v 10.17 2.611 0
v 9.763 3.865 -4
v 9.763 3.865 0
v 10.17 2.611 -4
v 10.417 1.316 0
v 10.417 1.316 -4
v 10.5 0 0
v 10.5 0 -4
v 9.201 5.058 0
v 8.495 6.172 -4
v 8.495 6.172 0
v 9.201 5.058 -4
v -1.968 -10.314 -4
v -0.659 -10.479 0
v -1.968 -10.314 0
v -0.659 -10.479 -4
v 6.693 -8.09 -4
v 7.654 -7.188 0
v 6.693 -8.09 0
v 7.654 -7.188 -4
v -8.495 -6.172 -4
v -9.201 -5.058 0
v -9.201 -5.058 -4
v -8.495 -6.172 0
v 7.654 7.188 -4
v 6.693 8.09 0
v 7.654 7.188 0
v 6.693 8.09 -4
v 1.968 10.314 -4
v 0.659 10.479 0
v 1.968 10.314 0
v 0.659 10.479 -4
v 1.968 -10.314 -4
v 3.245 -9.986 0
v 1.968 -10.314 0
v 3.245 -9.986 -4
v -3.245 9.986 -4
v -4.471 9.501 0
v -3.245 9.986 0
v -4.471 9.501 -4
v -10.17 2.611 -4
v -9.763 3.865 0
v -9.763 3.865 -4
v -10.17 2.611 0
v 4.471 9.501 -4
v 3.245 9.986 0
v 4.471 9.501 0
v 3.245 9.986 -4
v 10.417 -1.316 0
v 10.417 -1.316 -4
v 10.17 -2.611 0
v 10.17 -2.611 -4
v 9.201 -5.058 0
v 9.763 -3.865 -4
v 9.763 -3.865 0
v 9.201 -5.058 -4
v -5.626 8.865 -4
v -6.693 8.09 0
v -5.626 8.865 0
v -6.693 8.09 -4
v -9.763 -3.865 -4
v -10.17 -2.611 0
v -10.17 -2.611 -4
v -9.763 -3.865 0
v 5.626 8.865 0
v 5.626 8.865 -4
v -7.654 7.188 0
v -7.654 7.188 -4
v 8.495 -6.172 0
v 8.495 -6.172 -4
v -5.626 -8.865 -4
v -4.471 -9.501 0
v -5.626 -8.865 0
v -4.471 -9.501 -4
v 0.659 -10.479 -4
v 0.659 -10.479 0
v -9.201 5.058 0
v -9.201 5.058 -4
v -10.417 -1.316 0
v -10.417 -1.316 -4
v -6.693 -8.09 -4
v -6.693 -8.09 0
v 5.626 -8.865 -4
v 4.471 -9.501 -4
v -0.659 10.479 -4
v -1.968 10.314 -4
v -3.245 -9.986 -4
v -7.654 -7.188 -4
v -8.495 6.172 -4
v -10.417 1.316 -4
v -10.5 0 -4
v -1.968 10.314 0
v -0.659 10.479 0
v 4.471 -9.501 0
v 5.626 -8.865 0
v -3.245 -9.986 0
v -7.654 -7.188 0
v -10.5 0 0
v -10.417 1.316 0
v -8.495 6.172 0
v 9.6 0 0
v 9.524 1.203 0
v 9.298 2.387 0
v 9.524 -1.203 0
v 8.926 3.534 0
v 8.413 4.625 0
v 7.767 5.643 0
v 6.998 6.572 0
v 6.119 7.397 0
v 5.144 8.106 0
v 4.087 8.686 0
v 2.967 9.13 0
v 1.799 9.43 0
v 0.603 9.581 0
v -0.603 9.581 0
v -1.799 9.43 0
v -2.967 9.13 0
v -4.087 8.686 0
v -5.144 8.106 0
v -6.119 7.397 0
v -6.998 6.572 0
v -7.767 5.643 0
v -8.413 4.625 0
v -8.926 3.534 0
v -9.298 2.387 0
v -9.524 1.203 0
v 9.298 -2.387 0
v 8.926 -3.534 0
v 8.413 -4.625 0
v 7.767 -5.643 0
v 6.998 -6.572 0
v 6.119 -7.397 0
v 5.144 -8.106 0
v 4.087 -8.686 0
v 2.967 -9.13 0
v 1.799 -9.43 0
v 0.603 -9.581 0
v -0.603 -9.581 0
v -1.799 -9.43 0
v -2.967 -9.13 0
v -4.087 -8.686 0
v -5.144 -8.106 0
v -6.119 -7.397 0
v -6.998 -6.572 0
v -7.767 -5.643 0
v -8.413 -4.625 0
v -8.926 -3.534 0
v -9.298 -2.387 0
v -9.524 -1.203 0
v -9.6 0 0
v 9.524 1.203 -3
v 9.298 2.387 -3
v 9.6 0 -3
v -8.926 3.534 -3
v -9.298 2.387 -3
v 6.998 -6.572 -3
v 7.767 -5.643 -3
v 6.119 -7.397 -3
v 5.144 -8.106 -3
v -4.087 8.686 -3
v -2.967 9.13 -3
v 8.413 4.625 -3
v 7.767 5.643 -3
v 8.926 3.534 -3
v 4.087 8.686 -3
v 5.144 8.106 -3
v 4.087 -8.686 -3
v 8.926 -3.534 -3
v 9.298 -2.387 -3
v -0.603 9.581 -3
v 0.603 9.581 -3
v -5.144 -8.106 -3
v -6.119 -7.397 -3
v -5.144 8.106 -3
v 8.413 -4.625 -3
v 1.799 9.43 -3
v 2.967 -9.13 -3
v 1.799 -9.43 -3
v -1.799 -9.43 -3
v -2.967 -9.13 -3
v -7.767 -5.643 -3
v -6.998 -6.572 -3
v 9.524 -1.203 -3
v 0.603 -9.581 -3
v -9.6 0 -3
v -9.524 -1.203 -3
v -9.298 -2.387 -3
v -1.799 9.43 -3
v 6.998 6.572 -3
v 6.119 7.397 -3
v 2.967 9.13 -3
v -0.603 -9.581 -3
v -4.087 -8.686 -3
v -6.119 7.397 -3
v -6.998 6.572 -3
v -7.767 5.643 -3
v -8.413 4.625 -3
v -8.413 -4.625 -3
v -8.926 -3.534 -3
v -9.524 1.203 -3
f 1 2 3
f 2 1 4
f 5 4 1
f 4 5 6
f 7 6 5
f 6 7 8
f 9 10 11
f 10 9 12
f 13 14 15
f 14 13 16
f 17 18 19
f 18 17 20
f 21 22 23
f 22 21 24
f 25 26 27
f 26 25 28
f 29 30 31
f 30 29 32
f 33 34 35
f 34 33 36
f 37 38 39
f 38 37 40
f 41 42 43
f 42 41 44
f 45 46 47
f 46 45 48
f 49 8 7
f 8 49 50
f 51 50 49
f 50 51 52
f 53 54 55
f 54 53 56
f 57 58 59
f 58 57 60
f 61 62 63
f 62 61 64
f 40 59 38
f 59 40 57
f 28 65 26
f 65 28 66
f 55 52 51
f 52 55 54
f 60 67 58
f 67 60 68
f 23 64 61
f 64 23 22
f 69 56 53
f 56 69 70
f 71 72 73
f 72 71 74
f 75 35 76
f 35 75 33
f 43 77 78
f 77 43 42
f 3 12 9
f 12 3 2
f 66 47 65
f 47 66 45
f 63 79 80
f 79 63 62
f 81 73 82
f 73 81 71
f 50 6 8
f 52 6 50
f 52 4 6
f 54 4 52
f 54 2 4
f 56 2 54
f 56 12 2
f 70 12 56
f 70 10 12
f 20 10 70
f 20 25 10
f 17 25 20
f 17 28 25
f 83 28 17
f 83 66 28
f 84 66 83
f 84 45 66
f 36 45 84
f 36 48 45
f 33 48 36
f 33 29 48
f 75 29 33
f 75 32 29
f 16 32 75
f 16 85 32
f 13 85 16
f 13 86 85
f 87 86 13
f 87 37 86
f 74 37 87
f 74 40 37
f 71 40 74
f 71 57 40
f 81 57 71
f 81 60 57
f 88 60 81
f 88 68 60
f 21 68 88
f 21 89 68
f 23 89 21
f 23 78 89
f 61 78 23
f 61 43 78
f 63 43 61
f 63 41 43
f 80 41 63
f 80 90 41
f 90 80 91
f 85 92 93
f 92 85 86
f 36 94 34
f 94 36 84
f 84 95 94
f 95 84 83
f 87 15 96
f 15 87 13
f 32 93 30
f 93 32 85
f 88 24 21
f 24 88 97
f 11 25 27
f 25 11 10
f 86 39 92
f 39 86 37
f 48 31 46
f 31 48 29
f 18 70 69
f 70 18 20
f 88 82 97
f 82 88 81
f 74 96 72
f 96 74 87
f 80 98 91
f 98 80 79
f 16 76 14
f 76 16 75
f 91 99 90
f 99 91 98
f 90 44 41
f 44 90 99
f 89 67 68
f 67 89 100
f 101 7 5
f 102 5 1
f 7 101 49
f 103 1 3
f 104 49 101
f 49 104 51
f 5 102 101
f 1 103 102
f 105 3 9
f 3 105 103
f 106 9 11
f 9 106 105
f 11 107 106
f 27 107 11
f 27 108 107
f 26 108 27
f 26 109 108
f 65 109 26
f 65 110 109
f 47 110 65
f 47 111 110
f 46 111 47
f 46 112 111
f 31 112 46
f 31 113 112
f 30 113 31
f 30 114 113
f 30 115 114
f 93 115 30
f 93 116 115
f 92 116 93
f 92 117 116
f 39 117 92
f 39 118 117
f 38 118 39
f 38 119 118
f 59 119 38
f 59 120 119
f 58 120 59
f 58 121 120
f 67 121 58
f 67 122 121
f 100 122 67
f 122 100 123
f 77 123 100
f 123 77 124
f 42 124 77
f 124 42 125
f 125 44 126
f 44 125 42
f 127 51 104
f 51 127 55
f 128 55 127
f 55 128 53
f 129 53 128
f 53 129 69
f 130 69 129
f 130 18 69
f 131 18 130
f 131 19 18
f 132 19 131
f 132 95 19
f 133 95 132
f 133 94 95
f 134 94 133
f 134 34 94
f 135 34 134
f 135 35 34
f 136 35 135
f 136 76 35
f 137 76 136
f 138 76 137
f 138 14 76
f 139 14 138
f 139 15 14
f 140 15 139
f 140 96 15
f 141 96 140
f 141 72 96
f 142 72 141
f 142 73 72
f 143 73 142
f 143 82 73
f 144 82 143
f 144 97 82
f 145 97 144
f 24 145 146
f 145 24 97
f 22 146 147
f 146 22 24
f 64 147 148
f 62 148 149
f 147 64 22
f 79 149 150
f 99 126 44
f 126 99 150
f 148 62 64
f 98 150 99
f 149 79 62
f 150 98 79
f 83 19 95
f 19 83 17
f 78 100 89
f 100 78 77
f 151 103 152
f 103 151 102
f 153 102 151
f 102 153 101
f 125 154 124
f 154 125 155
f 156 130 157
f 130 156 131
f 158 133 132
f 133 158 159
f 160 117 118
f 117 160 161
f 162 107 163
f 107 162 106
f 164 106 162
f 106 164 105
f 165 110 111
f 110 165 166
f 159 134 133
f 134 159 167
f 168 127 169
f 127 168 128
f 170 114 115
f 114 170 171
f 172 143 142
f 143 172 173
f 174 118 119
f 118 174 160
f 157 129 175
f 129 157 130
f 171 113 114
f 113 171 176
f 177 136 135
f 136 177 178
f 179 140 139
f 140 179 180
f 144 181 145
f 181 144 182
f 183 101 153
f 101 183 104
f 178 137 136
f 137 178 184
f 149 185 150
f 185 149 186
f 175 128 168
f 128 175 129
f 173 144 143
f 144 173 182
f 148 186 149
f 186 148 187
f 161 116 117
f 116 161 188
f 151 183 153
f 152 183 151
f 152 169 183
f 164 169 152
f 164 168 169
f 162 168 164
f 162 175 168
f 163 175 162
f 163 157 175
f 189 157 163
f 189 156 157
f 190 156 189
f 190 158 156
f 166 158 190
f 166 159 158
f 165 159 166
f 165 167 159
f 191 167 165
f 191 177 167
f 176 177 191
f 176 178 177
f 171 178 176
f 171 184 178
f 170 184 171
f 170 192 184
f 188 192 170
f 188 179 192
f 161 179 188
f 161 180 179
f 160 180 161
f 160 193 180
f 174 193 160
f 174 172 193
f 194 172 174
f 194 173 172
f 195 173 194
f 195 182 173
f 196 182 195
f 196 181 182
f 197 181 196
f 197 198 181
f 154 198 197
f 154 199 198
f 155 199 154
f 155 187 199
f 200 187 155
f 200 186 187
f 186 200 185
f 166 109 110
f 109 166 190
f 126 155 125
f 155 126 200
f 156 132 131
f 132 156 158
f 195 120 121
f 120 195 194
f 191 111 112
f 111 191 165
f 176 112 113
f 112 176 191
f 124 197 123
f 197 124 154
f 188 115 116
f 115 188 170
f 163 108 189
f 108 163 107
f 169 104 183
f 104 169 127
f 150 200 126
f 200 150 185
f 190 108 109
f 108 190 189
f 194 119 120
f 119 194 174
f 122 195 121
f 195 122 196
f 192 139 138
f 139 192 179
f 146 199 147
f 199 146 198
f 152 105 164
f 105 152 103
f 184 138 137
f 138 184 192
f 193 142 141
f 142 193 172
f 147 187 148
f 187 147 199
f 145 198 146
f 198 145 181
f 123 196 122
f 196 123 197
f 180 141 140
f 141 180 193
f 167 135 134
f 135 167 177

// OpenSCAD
$fn = 50;


difference() {
	union() {
		translate(v = [0, 0, -4.0000000000]) {
			cylinder(h = 4, r = 10.5000000000);
		}
	}
	union() {
		#translate(v = [0, 0, -3.0000000000]) {
			cylinder(h = 3, r = 9.6000000000);
		}
	}
}
